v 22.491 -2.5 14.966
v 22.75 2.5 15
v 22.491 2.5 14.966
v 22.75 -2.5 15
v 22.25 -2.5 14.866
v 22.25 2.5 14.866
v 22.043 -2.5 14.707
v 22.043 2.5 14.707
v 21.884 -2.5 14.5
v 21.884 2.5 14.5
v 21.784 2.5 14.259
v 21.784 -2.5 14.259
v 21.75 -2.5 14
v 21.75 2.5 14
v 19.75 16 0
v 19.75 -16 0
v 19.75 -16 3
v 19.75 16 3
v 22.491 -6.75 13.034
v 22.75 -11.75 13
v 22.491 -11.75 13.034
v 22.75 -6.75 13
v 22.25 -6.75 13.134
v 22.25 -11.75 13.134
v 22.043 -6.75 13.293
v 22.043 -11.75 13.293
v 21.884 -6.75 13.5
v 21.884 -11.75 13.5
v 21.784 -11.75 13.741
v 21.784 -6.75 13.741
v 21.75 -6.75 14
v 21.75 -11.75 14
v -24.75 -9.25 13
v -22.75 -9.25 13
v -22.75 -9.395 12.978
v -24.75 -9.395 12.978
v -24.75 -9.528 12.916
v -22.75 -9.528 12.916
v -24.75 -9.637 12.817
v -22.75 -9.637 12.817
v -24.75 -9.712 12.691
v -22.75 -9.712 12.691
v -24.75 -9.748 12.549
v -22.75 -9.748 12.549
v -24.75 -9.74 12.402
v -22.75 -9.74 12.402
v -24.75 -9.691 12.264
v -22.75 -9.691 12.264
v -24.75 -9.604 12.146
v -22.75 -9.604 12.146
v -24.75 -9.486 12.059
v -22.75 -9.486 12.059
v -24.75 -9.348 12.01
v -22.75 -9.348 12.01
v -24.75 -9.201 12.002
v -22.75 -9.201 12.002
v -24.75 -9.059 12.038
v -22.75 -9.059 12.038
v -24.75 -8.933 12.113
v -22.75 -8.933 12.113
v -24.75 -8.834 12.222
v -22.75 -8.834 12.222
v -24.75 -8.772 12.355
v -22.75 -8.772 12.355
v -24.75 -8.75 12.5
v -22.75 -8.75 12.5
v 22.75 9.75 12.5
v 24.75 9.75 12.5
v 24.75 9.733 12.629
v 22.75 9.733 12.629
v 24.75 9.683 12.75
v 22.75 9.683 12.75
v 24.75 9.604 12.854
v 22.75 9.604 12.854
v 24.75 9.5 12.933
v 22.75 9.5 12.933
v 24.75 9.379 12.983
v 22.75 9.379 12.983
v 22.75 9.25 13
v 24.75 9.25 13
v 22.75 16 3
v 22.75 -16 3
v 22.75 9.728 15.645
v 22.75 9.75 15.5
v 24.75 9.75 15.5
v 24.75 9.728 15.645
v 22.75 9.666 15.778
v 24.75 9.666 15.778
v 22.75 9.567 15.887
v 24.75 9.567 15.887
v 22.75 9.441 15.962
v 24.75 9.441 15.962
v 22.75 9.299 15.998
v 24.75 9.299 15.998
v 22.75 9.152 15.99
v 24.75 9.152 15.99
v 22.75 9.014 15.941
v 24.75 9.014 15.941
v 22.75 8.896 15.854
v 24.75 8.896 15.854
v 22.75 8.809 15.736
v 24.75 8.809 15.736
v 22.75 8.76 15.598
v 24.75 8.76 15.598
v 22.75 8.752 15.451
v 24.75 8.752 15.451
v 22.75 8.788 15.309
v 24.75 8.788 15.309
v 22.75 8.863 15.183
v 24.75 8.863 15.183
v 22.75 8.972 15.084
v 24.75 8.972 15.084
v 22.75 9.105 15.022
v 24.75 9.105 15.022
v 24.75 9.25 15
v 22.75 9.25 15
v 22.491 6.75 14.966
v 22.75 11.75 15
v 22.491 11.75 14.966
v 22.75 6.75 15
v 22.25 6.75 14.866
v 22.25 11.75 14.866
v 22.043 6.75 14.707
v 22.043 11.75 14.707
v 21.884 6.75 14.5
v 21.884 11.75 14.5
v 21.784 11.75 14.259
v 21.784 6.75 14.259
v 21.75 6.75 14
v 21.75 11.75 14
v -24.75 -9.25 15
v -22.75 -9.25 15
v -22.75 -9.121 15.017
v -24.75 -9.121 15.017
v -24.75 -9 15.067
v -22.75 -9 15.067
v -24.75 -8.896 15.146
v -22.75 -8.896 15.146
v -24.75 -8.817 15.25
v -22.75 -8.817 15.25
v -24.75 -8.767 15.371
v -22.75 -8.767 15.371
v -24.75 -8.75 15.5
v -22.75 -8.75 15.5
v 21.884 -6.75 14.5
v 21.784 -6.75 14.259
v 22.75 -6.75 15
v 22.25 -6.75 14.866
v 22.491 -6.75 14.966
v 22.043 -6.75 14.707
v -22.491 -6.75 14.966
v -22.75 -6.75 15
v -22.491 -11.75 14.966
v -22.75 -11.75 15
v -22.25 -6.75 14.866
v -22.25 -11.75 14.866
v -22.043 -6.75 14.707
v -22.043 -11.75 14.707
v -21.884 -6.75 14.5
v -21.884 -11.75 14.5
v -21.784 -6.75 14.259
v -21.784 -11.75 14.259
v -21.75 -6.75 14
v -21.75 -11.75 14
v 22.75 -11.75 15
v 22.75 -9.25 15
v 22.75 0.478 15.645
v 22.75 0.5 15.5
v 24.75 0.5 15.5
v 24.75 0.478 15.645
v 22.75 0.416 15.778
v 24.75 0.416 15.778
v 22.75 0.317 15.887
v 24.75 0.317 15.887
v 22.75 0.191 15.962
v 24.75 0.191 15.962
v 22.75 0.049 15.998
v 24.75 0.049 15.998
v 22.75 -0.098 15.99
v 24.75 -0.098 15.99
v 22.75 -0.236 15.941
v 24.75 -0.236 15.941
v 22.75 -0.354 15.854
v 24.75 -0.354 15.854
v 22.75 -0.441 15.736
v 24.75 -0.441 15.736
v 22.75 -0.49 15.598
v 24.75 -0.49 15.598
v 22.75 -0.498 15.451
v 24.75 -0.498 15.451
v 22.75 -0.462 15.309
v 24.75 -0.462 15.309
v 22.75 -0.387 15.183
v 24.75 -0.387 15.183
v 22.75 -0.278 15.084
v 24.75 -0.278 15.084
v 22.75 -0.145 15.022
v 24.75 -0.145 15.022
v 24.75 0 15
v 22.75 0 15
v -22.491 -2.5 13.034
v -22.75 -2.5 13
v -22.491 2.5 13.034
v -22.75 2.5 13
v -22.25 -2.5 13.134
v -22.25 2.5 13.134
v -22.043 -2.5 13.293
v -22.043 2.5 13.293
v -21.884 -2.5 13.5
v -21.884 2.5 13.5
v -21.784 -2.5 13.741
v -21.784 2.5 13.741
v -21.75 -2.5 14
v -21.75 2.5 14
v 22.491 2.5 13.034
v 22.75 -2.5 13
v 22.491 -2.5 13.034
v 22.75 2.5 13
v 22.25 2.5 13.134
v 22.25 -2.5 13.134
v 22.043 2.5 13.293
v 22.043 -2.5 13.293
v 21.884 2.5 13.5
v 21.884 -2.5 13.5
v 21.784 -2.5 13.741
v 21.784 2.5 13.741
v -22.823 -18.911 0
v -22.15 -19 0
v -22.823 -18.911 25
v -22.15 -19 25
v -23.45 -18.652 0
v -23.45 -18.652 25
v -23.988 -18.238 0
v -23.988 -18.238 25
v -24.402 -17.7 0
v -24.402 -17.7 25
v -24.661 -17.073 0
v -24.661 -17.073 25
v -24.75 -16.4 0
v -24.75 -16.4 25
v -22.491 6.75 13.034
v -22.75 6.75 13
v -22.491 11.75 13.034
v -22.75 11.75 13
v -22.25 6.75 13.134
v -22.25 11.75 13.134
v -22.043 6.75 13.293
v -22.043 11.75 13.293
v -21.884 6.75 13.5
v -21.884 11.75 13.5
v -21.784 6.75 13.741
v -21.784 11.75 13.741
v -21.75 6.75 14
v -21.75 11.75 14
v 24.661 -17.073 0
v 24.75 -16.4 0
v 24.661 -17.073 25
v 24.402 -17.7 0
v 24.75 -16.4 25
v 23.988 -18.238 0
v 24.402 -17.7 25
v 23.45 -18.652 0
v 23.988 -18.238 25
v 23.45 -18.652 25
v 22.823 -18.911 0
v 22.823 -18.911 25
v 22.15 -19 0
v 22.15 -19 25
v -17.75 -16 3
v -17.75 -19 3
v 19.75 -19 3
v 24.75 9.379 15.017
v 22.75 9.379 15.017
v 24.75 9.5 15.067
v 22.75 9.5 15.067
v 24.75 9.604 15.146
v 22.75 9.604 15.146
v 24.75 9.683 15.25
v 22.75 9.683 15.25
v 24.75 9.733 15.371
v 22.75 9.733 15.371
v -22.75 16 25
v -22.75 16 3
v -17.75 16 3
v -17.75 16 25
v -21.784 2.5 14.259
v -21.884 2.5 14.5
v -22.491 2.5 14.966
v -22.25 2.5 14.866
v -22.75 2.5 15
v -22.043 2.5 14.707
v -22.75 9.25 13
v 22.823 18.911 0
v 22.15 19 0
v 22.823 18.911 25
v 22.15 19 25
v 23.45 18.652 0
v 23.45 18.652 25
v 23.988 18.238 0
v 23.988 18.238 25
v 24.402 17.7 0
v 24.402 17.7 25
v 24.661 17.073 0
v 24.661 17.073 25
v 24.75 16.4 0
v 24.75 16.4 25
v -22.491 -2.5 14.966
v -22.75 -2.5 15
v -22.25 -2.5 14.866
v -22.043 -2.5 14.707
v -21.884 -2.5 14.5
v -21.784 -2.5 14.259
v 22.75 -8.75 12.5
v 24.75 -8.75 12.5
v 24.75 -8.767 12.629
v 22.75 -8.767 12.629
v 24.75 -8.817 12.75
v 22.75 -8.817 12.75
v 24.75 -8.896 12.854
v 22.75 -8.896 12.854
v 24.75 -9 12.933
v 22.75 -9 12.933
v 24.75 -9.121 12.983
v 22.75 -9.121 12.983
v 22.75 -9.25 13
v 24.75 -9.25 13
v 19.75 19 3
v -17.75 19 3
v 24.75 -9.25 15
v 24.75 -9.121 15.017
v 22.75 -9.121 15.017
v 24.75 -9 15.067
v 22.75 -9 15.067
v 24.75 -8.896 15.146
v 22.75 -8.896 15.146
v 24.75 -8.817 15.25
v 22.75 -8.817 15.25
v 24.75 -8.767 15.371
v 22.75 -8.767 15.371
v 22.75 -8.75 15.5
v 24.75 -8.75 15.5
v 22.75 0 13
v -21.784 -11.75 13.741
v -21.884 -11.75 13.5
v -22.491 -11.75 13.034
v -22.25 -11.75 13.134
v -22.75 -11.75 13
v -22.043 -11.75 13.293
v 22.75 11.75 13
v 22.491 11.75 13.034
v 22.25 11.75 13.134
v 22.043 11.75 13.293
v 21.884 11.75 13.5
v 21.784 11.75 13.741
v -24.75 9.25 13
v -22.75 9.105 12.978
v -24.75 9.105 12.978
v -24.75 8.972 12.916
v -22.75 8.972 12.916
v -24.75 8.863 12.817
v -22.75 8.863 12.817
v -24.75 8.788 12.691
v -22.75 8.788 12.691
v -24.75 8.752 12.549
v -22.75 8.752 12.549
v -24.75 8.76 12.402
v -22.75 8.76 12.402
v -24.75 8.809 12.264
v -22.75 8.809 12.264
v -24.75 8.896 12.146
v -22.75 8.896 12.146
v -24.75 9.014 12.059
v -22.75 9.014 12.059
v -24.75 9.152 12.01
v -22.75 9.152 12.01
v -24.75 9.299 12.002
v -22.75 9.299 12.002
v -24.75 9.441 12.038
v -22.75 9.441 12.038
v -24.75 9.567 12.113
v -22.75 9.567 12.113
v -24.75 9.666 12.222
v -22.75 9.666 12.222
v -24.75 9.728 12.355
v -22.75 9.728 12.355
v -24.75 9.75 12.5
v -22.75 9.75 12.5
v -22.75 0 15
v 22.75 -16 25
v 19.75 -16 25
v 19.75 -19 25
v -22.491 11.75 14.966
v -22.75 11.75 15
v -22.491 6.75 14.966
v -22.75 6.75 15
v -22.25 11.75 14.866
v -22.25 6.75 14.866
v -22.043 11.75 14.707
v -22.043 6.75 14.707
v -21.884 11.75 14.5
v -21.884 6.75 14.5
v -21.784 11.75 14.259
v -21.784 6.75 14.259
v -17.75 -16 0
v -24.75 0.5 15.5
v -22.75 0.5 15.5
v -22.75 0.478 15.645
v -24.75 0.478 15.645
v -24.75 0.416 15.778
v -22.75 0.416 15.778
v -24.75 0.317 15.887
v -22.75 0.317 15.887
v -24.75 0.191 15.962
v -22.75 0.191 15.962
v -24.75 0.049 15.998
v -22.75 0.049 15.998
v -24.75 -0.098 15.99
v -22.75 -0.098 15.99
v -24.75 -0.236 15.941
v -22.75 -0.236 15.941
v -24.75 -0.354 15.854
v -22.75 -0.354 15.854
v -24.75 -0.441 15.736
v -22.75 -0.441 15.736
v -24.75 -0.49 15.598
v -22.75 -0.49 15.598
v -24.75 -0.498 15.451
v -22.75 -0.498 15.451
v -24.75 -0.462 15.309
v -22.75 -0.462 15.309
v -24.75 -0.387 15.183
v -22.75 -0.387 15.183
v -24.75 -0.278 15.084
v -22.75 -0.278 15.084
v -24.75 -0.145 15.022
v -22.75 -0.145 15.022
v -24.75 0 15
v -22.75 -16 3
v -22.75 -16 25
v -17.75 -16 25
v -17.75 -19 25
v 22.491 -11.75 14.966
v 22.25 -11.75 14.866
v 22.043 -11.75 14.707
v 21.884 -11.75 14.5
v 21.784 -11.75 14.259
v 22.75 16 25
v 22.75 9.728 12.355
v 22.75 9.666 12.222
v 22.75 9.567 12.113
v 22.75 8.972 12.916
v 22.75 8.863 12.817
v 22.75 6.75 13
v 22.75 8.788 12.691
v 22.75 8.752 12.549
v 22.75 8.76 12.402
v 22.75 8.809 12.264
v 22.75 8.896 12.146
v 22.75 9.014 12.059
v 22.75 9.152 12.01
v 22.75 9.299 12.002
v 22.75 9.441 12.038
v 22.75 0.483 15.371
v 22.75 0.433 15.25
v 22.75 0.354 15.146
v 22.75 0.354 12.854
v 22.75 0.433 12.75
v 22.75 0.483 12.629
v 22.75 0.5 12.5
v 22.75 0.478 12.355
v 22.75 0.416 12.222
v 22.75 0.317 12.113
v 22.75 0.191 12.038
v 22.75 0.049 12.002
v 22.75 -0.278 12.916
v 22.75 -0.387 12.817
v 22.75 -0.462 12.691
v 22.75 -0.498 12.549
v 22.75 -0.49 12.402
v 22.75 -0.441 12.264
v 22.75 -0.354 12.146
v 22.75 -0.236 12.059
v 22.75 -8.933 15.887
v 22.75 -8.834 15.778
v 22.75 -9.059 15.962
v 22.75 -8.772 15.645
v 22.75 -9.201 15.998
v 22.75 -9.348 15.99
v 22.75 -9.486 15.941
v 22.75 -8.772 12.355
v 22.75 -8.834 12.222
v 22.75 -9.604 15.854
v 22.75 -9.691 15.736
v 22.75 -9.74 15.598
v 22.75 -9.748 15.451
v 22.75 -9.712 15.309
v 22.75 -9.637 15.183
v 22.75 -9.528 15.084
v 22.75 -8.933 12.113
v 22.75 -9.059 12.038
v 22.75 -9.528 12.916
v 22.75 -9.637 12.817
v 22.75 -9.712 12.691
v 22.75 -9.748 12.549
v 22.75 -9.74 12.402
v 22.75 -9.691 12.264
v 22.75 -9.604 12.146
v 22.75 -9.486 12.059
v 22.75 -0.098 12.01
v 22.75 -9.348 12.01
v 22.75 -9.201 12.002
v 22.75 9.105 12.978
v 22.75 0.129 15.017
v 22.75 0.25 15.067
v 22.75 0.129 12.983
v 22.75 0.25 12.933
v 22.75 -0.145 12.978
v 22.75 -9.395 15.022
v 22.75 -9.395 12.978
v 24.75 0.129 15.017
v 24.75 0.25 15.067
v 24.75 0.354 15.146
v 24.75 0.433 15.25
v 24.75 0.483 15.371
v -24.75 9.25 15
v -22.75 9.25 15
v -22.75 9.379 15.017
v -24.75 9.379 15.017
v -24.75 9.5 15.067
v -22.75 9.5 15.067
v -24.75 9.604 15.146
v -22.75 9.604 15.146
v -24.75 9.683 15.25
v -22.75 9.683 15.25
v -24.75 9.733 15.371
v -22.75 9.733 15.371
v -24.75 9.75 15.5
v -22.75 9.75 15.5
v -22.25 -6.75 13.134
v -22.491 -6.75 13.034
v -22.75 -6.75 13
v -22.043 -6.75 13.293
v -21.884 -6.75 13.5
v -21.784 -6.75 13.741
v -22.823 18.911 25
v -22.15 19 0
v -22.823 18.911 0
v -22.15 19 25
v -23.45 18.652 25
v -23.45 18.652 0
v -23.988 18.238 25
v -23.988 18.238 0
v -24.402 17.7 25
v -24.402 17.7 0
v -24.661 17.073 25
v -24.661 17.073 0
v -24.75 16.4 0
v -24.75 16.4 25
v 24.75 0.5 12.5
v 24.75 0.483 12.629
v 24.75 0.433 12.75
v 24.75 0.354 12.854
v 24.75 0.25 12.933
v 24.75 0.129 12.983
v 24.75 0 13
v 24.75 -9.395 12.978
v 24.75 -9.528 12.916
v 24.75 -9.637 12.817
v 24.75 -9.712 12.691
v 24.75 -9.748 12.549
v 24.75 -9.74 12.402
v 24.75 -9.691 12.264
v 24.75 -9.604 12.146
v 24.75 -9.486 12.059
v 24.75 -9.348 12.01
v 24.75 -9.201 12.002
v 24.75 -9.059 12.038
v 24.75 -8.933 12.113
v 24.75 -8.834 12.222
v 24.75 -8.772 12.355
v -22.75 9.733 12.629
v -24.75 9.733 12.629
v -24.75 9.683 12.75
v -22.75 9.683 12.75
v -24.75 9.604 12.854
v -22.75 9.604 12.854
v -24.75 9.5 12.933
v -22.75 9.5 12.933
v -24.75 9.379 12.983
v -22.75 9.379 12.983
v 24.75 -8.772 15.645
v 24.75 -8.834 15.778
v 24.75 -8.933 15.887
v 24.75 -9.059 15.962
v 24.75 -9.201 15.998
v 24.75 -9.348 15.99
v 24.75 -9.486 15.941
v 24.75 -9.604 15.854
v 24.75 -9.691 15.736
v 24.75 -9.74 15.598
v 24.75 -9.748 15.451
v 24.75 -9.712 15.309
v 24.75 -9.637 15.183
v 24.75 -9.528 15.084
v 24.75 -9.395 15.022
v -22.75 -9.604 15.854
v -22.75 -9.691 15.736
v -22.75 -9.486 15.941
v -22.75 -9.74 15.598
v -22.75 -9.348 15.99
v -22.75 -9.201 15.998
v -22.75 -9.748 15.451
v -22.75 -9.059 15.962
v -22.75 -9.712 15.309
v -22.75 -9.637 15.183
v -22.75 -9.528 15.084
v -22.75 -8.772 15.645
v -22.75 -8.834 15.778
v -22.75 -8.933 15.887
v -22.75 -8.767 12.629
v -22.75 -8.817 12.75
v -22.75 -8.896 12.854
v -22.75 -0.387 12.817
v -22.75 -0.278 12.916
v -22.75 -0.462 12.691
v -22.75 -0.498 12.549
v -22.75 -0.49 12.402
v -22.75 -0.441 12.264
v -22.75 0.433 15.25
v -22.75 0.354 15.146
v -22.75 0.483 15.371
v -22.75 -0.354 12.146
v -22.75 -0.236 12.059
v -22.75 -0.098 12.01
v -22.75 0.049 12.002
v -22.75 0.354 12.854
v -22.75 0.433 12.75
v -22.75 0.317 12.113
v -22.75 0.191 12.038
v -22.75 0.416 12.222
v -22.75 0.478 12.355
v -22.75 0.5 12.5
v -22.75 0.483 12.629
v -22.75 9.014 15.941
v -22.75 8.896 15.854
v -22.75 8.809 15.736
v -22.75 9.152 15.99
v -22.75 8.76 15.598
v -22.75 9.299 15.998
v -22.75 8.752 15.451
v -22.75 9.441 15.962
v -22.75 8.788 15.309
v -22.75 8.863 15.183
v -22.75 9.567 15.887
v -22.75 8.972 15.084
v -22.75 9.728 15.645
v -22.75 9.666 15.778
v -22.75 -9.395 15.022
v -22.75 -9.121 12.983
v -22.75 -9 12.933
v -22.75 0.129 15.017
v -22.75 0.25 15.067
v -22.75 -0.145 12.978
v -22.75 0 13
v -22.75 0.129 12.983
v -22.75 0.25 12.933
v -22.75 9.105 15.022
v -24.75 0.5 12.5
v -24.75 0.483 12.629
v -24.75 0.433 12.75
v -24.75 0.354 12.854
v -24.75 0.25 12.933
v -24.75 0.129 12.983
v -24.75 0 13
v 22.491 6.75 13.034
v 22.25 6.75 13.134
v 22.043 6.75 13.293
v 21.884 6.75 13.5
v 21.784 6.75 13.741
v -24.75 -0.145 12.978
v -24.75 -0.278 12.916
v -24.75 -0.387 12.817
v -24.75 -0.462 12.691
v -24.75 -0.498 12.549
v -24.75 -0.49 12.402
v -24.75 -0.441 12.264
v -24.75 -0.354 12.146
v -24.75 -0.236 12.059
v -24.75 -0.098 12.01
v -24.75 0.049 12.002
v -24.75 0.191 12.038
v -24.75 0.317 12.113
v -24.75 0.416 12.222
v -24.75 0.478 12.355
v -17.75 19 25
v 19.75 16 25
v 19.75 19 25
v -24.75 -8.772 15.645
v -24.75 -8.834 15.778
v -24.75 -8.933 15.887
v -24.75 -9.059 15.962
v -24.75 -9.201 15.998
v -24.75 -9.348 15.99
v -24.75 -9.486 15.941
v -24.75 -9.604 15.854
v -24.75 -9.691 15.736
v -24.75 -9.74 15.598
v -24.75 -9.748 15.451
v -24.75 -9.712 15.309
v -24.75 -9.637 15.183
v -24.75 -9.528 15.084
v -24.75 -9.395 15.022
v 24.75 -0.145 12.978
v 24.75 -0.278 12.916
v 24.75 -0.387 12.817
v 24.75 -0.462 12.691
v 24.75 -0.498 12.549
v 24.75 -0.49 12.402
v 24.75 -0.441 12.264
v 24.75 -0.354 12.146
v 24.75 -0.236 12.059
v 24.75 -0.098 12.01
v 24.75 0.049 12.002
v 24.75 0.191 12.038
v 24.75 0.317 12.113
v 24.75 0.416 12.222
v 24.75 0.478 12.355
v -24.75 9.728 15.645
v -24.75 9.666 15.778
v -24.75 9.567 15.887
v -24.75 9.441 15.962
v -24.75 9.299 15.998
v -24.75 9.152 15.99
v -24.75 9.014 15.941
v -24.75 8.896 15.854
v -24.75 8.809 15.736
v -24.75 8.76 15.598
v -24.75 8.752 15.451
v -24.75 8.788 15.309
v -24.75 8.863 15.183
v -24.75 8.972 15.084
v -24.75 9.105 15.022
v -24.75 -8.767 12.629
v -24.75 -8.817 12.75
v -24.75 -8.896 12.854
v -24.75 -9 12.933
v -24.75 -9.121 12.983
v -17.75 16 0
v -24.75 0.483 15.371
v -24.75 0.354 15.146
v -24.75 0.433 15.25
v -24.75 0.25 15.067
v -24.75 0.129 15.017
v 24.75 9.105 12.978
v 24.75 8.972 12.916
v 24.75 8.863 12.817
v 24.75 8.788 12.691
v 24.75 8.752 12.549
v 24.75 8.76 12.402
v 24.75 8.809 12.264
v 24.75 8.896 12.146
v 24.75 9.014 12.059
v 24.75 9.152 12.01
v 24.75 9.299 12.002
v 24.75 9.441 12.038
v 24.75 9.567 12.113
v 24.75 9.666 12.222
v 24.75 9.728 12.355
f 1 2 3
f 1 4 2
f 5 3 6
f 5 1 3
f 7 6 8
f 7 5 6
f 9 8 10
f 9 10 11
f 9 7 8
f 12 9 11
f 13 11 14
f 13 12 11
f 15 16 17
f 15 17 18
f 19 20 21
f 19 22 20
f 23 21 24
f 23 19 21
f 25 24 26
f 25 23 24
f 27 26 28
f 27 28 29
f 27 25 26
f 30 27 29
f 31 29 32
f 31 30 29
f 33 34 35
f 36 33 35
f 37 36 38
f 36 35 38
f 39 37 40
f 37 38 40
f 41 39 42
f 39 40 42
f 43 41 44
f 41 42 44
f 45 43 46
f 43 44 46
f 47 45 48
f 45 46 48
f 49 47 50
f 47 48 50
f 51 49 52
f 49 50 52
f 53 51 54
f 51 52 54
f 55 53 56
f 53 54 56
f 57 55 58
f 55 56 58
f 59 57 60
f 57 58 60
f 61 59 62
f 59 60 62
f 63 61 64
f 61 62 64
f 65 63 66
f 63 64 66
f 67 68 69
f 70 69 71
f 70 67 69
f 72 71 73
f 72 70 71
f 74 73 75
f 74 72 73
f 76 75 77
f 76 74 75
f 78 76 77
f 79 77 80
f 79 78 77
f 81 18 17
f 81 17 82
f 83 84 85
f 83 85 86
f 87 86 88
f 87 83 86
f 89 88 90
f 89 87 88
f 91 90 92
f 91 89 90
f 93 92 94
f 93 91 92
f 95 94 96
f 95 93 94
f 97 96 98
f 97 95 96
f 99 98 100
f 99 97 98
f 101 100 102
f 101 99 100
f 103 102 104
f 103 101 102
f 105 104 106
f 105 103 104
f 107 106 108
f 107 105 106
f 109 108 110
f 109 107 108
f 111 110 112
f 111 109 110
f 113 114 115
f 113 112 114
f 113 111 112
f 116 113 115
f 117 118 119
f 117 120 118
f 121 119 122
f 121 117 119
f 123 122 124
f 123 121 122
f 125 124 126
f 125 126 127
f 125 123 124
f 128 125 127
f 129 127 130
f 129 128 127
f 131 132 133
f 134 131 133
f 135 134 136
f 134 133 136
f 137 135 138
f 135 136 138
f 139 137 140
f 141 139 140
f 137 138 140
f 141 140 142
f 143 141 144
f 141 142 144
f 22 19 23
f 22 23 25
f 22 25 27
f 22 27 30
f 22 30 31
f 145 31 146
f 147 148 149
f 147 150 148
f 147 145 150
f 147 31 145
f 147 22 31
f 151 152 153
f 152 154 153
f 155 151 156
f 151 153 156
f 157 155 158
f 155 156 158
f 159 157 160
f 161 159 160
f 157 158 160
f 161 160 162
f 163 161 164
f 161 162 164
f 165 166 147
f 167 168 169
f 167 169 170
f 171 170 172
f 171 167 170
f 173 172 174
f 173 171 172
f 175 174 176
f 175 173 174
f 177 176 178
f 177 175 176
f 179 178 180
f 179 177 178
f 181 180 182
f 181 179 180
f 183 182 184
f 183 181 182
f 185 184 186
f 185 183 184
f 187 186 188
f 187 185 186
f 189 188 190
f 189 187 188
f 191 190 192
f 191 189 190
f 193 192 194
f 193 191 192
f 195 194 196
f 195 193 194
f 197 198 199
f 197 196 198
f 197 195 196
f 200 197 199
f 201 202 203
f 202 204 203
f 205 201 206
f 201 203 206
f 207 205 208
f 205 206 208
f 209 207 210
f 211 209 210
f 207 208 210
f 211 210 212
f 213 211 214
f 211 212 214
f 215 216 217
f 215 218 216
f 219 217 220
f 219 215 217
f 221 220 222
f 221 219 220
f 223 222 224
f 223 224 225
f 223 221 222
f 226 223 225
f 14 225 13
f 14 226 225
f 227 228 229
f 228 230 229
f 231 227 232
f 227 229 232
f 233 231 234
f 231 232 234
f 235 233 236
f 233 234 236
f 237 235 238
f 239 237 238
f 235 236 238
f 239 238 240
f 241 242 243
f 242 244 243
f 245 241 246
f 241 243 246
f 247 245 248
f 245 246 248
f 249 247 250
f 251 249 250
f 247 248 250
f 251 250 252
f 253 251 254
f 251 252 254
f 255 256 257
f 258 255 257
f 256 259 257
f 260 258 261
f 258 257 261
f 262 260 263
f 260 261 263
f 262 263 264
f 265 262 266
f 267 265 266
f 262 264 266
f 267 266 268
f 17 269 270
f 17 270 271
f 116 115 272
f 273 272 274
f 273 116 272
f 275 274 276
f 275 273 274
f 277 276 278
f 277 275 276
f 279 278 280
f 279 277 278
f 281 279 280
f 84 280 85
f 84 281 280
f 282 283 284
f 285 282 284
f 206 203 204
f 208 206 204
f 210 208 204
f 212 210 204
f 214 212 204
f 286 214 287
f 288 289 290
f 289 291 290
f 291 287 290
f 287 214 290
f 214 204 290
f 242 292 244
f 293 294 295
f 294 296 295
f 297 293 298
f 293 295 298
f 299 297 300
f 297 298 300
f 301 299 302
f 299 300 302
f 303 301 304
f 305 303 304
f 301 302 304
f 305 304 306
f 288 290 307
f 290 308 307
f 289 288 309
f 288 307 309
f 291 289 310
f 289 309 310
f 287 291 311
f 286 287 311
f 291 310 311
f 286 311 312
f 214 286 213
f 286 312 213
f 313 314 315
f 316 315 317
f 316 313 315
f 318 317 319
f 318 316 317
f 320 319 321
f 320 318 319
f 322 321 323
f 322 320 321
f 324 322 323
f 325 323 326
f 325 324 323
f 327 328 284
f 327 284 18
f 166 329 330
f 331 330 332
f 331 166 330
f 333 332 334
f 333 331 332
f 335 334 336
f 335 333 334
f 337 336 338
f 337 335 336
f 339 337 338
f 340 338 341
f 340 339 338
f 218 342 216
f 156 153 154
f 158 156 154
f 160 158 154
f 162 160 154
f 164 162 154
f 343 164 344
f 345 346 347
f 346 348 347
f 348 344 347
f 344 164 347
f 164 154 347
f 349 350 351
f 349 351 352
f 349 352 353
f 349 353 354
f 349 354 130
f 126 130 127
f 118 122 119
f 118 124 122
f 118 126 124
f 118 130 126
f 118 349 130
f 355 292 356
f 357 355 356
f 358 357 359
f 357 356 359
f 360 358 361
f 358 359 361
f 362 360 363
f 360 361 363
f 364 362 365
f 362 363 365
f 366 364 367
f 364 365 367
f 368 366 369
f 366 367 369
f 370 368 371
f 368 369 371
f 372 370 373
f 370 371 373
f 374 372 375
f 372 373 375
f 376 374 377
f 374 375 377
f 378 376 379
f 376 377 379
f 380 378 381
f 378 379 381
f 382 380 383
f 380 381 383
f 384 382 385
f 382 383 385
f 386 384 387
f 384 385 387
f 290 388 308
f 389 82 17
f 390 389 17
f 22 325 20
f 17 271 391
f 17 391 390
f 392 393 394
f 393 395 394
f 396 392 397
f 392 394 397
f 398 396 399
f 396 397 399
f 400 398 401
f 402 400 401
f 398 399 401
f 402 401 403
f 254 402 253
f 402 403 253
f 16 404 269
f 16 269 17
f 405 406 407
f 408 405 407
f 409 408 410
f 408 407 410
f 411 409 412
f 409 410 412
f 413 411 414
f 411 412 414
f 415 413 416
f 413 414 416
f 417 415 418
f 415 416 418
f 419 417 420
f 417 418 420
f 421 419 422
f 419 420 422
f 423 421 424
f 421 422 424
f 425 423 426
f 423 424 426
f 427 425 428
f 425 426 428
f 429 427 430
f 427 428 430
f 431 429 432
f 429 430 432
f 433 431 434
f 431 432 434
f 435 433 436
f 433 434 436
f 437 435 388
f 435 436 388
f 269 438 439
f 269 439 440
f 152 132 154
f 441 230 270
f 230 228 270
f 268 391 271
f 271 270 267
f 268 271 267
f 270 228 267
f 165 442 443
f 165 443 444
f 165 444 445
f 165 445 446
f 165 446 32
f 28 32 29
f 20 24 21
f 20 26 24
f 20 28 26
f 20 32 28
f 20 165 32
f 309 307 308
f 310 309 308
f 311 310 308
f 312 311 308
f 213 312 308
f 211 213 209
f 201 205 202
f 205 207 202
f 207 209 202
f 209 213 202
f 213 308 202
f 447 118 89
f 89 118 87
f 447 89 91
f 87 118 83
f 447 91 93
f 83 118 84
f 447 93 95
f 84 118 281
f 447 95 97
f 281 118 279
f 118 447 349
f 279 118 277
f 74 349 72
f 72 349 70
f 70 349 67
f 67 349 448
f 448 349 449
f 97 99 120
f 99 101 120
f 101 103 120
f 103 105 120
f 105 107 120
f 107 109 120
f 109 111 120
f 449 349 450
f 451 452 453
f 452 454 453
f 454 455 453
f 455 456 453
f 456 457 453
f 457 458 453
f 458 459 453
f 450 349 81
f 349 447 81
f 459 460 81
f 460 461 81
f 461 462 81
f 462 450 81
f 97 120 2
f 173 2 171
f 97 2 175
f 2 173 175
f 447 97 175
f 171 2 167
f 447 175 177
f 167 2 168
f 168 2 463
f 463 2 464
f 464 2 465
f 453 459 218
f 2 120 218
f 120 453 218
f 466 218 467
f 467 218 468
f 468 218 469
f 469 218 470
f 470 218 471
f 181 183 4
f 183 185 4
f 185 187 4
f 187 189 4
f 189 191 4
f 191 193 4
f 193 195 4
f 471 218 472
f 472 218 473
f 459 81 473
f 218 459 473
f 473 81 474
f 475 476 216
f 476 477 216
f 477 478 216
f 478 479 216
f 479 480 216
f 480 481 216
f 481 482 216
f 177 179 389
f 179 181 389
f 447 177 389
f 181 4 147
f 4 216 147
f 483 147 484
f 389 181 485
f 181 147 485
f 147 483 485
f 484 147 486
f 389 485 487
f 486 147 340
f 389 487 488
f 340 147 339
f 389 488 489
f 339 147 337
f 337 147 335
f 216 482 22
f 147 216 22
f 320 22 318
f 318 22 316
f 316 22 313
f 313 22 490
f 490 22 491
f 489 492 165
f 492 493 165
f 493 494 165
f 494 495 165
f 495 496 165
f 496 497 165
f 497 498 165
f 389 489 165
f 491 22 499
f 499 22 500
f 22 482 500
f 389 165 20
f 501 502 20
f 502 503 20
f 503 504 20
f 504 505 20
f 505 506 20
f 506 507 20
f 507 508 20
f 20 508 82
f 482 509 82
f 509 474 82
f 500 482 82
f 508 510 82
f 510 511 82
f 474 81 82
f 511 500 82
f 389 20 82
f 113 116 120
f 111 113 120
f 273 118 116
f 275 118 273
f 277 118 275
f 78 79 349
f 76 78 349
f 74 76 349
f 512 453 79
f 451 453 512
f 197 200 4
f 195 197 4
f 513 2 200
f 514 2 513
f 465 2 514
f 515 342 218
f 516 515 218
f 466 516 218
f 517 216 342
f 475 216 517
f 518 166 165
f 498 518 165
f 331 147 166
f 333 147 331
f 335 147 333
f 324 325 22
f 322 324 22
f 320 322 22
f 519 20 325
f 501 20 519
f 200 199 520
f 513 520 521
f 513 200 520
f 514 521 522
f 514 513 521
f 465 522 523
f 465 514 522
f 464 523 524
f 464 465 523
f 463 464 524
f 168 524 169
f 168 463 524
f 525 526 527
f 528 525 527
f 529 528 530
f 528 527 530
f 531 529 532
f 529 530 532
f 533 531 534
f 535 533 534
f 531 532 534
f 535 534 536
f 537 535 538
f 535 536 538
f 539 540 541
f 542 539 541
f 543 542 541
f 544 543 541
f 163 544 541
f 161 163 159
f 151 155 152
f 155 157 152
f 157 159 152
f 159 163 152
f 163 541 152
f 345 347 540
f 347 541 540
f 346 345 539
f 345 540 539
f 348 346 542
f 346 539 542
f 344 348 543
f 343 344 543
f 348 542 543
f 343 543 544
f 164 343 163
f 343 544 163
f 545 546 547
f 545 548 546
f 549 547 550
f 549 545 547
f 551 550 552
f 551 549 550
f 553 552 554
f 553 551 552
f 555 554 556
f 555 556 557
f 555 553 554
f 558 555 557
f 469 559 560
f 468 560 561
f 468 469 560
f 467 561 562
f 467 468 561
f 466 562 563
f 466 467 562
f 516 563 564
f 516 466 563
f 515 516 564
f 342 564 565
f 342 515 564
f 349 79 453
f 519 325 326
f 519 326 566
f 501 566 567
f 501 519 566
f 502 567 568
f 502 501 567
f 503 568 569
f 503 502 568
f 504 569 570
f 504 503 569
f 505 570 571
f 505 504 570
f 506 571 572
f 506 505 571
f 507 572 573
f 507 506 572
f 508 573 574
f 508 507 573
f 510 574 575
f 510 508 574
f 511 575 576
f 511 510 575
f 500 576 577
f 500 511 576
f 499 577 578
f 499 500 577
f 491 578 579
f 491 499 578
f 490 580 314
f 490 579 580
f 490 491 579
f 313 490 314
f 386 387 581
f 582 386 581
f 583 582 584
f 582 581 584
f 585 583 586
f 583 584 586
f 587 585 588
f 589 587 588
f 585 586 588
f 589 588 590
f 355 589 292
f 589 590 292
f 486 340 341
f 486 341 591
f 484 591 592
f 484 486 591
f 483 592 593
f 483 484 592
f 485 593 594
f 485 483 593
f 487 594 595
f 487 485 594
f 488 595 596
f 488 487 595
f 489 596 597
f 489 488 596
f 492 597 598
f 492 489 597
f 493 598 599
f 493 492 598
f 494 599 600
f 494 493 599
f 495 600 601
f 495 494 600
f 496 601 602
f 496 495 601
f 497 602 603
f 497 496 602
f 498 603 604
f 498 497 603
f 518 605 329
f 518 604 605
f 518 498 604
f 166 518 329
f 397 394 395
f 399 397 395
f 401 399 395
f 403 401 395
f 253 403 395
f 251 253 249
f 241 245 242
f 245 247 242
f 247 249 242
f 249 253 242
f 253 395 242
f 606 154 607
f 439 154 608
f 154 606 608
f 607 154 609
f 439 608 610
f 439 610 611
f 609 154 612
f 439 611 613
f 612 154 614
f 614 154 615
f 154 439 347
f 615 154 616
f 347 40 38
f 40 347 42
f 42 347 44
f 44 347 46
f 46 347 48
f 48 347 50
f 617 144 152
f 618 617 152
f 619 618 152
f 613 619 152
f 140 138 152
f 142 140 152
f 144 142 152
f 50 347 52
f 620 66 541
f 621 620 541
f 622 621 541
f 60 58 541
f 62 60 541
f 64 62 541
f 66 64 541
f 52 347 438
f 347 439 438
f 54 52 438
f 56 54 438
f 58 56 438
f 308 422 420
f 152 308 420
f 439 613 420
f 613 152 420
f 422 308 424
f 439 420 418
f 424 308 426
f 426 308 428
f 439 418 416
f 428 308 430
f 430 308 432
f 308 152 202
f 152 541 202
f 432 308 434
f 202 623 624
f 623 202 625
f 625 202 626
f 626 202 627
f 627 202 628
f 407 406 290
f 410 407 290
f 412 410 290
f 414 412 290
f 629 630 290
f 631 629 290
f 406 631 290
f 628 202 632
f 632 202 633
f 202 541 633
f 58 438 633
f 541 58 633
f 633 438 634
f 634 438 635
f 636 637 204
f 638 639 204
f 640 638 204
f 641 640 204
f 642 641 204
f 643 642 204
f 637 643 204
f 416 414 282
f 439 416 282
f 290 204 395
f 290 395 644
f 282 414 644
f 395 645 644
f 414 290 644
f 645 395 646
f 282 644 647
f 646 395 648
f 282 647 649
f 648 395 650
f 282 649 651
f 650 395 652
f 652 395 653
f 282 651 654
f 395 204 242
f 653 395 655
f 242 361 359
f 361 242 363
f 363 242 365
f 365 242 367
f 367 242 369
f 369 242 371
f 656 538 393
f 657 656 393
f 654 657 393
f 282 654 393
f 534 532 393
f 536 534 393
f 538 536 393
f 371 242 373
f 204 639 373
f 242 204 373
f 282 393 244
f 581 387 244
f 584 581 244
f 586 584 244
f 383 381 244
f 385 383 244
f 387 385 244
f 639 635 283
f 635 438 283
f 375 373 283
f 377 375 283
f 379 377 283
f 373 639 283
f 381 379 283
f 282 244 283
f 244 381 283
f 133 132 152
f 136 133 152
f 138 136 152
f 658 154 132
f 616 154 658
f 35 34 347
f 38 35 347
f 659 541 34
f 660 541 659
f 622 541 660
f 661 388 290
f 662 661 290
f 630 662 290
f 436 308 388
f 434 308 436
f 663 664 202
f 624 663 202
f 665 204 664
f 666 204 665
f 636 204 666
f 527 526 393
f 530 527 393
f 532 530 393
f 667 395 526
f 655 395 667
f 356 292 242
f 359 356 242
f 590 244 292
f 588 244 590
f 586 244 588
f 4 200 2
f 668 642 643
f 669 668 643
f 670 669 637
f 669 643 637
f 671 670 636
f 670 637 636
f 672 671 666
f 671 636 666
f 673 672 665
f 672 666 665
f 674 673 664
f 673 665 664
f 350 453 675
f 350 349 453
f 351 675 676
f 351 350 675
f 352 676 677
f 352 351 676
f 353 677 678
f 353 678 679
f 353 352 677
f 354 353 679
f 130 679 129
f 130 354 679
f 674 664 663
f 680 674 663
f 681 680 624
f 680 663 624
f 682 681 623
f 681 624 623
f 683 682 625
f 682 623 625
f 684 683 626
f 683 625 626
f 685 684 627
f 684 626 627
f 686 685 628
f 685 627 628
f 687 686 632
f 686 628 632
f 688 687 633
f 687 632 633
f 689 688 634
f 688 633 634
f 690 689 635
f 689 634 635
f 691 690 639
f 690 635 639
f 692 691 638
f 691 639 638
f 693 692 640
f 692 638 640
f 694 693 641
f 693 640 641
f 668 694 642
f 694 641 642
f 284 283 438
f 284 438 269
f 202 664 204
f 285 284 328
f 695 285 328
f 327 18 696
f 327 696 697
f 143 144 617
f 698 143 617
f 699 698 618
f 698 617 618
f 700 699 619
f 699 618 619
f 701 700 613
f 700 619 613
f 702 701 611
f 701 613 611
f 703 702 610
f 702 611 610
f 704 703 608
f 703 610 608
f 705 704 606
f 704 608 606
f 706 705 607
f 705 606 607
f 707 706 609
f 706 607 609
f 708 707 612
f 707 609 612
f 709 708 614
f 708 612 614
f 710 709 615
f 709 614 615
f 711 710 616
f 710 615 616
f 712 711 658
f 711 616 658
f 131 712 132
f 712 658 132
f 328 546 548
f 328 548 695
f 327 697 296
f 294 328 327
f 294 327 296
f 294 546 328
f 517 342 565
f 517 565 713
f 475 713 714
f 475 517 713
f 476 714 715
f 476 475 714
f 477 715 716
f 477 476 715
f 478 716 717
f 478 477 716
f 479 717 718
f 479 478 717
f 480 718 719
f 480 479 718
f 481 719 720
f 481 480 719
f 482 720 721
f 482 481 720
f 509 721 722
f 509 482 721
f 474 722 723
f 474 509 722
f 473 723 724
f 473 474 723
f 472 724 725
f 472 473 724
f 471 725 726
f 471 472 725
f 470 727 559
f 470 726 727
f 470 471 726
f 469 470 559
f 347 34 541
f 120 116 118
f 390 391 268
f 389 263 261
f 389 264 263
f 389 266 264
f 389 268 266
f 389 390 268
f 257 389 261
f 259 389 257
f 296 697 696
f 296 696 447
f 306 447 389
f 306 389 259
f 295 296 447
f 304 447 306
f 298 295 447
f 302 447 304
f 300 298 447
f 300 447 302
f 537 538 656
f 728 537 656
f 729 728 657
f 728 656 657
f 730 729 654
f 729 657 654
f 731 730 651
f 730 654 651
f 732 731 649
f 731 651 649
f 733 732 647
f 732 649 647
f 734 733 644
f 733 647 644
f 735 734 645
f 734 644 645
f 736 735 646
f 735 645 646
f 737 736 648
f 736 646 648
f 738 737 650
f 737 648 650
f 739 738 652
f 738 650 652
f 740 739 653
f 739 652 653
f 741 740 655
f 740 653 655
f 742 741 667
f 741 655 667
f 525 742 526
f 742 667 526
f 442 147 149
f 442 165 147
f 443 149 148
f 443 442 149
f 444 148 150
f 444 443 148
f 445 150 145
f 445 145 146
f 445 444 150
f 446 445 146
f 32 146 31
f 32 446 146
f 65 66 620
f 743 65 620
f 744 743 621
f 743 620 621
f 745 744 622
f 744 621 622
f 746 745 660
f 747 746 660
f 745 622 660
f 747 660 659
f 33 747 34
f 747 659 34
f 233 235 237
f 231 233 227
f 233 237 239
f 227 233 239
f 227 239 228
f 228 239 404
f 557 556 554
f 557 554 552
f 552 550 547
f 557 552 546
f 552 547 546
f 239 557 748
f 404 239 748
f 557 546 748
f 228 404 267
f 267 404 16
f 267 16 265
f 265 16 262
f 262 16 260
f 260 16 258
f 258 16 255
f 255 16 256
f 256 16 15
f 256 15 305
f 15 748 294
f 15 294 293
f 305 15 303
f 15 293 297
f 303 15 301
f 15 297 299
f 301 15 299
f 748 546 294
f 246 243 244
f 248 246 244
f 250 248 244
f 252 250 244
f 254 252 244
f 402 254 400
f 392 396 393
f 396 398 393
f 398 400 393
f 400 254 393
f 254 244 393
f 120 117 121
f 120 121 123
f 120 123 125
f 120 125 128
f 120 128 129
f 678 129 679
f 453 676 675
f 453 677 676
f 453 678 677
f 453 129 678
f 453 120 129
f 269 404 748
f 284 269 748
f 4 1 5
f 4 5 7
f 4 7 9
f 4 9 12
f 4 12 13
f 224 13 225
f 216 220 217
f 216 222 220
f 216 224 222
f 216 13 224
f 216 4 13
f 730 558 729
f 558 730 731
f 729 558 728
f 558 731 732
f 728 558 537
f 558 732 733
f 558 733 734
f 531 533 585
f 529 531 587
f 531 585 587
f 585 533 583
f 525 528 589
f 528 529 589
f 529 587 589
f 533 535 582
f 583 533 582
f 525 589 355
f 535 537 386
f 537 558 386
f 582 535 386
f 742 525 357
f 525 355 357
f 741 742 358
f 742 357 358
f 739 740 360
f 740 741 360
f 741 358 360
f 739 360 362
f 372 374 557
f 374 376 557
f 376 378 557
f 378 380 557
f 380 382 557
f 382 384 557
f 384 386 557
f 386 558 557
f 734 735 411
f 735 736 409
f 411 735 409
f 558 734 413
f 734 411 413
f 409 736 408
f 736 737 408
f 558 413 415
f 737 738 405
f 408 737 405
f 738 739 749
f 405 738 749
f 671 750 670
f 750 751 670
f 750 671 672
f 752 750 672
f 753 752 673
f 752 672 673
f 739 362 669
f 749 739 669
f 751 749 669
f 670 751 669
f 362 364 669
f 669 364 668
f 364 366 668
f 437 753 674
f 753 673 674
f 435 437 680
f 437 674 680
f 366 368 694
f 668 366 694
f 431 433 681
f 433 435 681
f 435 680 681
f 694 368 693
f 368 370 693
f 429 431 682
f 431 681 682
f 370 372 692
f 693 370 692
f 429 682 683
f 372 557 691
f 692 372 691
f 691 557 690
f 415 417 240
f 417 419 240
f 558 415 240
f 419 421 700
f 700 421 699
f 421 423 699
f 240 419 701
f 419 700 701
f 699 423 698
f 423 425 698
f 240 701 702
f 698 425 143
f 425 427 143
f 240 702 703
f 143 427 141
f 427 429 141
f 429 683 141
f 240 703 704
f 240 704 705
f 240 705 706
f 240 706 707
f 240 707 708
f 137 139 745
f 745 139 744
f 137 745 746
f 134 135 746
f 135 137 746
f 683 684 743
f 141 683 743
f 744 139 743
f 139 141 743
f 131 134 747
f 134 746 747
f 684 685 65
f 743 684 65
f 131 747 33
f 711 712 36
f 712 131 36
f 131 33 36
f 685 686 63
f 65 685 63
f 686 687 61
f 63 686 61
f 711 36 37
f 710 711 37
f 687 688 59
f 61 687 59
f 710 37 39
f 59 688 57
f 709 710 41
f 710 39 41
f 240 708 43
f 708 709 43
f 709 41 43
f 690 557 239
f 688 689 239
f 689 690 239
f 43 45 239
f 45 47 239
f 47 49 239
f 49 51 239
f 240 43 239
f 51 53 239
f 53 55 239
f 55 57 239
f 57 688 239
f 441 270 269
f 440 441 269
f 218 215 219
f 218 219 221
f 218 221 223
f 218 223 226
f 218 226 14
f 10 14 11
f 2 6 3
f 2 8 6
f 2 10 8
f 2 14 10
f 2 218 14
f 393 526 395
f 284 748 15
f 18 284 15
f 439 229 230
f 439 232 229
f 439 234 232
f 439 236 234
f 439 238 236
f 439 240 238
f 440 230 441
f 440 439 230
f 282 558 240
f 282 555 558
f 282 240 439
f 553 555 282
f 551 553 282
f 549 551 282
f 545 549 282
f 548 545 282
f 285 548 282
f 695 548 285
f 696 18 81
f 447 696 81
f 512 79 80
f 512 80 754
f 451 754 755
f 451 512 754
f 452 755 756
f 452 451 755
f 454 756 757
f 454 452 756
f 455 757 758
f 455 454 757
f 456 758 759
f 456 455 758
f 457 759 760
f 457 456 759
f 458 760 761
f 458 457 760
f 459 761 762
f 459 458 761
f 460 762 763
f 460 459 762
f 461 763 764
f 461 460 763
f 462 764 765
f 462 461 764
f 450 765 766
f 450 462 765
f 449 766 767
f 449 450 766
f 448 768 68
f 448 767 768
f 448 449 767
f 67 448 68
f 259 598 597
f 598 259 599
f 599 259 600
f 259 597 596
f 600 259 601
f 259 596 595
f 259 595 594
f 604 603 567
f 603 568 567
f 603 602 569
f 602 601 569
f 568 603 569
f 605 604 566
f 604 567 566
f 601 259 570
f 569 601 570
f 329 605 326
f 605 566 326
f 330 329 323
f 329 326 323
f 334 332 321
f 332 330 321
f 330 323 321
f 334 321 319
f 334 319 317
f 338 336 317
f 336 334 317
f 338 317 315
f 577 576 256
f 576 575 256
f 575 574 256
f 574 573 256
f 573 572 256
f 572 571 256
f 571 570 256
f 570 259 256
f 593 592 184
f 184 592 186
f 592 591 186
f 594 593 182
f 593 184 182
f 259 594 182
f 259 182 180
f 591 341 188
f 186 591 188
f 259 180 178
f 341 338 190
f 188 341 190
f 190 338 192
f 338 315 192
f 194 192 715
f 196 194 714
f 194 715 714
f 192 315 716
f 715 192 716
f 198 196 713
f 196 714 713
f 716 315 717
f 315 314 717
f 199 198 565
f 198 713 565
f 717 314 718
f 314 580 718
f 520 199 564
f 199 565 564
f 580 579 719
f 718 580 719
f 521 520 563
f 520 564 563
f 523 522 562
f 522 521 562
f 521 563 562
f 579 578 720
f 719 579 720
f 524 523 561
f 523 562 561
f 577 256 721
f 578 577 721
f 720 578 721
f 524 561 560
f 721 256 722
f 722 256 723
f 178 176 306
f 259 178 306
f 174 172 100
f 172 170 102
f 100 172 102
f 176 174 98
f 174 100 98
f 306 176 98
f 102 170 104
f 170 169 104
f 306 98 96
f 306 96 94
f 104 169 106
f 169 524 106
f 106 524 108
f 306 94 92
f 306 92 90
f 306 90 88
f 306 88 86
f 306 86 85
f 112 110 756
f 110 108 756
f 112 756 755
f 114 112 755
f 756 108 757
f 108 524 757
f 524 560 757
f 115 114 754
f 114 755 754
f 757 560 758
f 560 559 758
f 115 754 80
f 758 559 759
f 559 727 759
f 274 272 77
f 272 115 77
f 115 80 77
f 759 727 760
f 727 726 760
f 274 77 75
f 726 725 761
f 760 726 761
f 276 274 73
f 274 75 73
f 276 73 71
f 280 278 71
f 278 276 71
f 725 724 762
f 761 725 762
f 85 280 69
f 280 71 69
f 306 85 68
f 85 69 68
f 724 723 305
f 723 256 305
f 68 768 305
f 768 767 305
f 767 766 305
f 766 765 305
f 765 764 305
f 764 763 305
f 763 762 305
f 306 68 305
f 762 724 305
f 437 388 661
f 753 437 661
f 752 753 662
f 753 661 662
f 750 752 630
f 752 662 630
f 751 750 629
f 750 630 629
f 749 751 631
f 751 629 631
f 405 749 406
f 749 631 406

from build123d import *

# Parameters (mm, degrees)
F0_W      = 2
F0_H      = 32
F0_H_2    = 3
F0_W_2    = 5
F1_DEPTH  = 25
F0_W_3    = 3
F0_W_4    = 37.5
F2_DEPTH  = 3
F3_R      = 2.6
F6_DEPTH  = 1
F7_R      = 0.99999
F10_DEPTH = 1
F11_R     = 0.99999
F12_DEPTH = 5
F13_DEPTH = 5


# Not quite as in the source:
# - a fillet or chamfer is up to 0.001 mm smaller than in the source, because OpenCascade refuses the exact size
# - a feature names something its author has since deleted; it is built from what else it names


with BuildPart() as f1:
    # F0 (on Top) → F1 (new body)
    with BuildSketch(Plane.XY):
        with Locations((-23.75, 0)):
            Rectangle(F0_W, F0_H)
        with Locations((-23.75, 17.5)):
            Rectangle(F0_W, F0_H_2)
        with Locations((-23.75, -17.5)):
            Rectangle(F0_W, F0_H_2)
        with Locations((-20.25, 17.5)):
            Rectangle(F0_W_2, F0_H_2)
        with Locations((-20.25, -17.5)):
            Rectangle(F0_W_2, F0_H_2)
    extrude(amount=F1_DEPTH)



with BuildPart() as f1b:
    # F0 (on Top) → F1, piece 2 (new body)
    with BuildSketch(Plane.XY):
        with Locations((21.25, -17.5)):
            Rectangle(F0_W_3, F0_H_2)
        with Locations((23.75, -17.5)):
            Rectangle(F0_W, F0_H_2)
        with Locations((23.75, 0)):
            Rectangle(F0_W, F0_H)
        with Locations((23.75, 17.5)):
            Rectangle(F0_W, F0_H_2)
        with Locations((21.25, 17.5)):
            Rectangle(F0_W_3, F0_H_2)
    extrude(amount=F1_DEPTH)


with BuildPart() as f1_1:
    add(f1.part)

    add(f1b.part)  # F2 merges F1b
    # F0 (on Top) → F2 (join)
    with BuildSketch(Plane.XY):
        with Locations((21.25, 0)):
            Rectangle(F0_W_3, F0_H)
        with Locations((1, 17.5)):
            Rectangle(F0_W_4, F0_H_2)
        with Locations((-20.25, 0)):
            Rectangle(F0_W_2, F0_H)
        with Locations((1, -17.5)):
            Rectangle(F0_W_4, F0_H_2)
    extrude(amount=F2_DEPTH)

    # F3
    f3_edges = [f1_1.edges().sort_by_distance(p)[0] for p in [
        (-24.75, 19, 12.5),
        (24.75, 19, 12.5),
        (24.75, -19, 12.5),
        (-24.75, -19, 12.5),
    ]]
    fillet(f3_edges, radius=F3_R)

    # F5 (on face) → F6 (join)
    with BuildSketch(Plane.YZ.offset(22.75)):
        Polygon((-11.75, 15), (-11.75, 13), (-9.25, 13), (-6.75, 13), (-6.75, 15), (-9.25, 15), align=None)
        Polygon((-2.5, 15), (-2.5, 13), (0, 13), (2.5, 13), (2.5, 15), (0, 15), align=None)
        Polygon((6.75, 15), (6.75, 13), (9.25, 13), (11.75, 13), (11.75, 15), (9.25, 15), align=None)
    extrude(amount=-F6_DEPTH)

    # F7 (radius 1 in the source; OpenCascade refuses exactly that, so slightly less here)
    f7_edges = [f1_1.edges().sort_by_distance(p)[0] for p in [
        (21.75, -9.25, 15),
        (21.75, -9.25, 13),
        (21.75, 0, 15),
        (21.75, 0, 13),
        (21.75, 9.25, 13),
        (21.75, 9.25, 15),
    ]]
    fillet(f7_edges, radius=F7_R)

    # F9 (on face) → F10 (join)
    with BuildSketch(Plane.YZ.offset(-22.75)):
        Polygon((-11.75, 15), (-11.75, 13), (-9.25, 13), (-6.75, 13), (-6.75, 15), (-9.25, 15), align=None)
        Polygon((-2.5, 15), (-2.5, 13), (0, 13), (2.5, 13), (2.5, 15), (0, 15), align=None)
        Polygon((6.75, 15), (6.75, 13), (9.25, 13), (11.75, 13), (11.75, 15), (9.25, 15), align=None)
    extrude(amount=F10_DEPTH)

    # F11 (radius 1 in the source; OpenCascade refuses exactly that, so slightly less here)
    f11_edges = [f1_1.edges().sort_by_distance(p)[0] for p in [
        (-21.75, -9.25, 15),
        (-21.75, -9.25, 13),
        (-21.75, 0, 15),
        (-21.75, 9.25, 15),
        (-21.75, 0, 13),
        (-21.75, 9.25, 13),
    ]]
    fillet(f11_edges, radius=F11_R)

    # F5 (on face) → F12 (cut)
    with BuildSketch(Plane.YZ.offset(22.75)):
        with BuildLine():
            ThreePointArc((-8.75, 15.5), (-9.6035533906, 15.8535533906), (-9.25, 15))
            ThreePointArc((-9.25, 15), (-8.8964466094, 15.1464466094), (-8.75, 15.5))
        make_face()
        with BuildLine():
            ThreePointArc((0.5, 15.5), (-0.3535533906, 15.8535533906), (0, 15))
            ThreePointArc((0, 15), (0.3535533906, 15.1464466094), (0.5, 15.5))
        make_face()
        with BuildLine():
            ThreePointArc((9.75, 15.5), (8.8964466094, 15.8535533906), (9.25, 15))
            ThreePointArc((9.25, 15), (9.6035533906, 15.1464466094), (9.75, 15.5))
        make_face()
        with BuildLine():
            ThreePointArc((9.75, 12.5), (9.6035533906, 12.8535533906), (9.25, 13))
            ThreePointArc((9.25, 13), (8.8964466094, 12.1464466094), (9.75, 12.5))
        make_face()
        with BuildLine():
            ThreePointArc((0.5, 12.5), (0.3535533906, 12.8535533906), (0, 13))
            ThreePointArc((0, 13), (-0.3535533906, 12.1464466094), (0.5, 12.5))
        make_face()
        with BuildLine():
            ThreePointArc((-8.75, 12.5), (-8.8964466094, 12.8535533906), (-9.25, 13))
            ThreePointArc((-9.25, 13), (-9.6035533906, 12.1464466094), (-8.75, 12.5))
        make_face()
    extrude(amount=F12_DEPTH, mode=Mode.SUBTRACT)

    # F9 (on face) → F13 (cut)
    with BuildSketch(Plane.YZ.offset(-22.75)):
        with BuildLine():
            ThreePointArc((-8.75, 15.5), (-9.6035533906, 15.8535533906), (-9.25, 15))
            ThreePointArc((-9.25, 15), (-8.8964466094, 15.1464466094), (-8.75, 15.5))
        make_face()
        with BuildLine():
            ThreePointArc((0.5, 15.5), (-0.3535533906, 15.8535533906), (0, 15))
            ThreePointArc((0, 15), (0.3535533906, 15.1464466094), (0.5, 15.5))
        make_face()
        with BuildLine():
            ThreePointArc((9.75, 15.5), (8.8964466094, 15.8535533906), (9.25, 15))
            ThreePointArc((9.25, 15), (9.6035533906, 15.1464466094), (9.75, 15.5))
        make_face()
        with BuildLine():
            ThreePointArc((9.75, 12.5), (9.6035533906, 12.8535533906), (9.25, 13))
            ThreePointArc((9.25, 13), (8.8964466094, 12.1464466094), (9.75, 12.5))
        make_face()
        with BuildLine():
            ThreePointArc((0.5, 12.5), (0.3535533906, 12.8535533906), (0, 13))
            ThreePointArc((0, 13), (-0.3535533906, 12.1464466094), (0.5, 12.5))
        make_face()
        with BuildLine():
            ThreePointArc((-8.75, 12.5), (-8.8964466094, 12.8535533906), (-9.25, 13))
            ThreePointArc((-9.25, 13), (-9.6035533906, 12.1464466094), (-8.75, 12.5))
        make_face()
    extrude(amount=-F13_DEPTH, mode=Mode.SUBTRACT)


solid = f1_1.part
